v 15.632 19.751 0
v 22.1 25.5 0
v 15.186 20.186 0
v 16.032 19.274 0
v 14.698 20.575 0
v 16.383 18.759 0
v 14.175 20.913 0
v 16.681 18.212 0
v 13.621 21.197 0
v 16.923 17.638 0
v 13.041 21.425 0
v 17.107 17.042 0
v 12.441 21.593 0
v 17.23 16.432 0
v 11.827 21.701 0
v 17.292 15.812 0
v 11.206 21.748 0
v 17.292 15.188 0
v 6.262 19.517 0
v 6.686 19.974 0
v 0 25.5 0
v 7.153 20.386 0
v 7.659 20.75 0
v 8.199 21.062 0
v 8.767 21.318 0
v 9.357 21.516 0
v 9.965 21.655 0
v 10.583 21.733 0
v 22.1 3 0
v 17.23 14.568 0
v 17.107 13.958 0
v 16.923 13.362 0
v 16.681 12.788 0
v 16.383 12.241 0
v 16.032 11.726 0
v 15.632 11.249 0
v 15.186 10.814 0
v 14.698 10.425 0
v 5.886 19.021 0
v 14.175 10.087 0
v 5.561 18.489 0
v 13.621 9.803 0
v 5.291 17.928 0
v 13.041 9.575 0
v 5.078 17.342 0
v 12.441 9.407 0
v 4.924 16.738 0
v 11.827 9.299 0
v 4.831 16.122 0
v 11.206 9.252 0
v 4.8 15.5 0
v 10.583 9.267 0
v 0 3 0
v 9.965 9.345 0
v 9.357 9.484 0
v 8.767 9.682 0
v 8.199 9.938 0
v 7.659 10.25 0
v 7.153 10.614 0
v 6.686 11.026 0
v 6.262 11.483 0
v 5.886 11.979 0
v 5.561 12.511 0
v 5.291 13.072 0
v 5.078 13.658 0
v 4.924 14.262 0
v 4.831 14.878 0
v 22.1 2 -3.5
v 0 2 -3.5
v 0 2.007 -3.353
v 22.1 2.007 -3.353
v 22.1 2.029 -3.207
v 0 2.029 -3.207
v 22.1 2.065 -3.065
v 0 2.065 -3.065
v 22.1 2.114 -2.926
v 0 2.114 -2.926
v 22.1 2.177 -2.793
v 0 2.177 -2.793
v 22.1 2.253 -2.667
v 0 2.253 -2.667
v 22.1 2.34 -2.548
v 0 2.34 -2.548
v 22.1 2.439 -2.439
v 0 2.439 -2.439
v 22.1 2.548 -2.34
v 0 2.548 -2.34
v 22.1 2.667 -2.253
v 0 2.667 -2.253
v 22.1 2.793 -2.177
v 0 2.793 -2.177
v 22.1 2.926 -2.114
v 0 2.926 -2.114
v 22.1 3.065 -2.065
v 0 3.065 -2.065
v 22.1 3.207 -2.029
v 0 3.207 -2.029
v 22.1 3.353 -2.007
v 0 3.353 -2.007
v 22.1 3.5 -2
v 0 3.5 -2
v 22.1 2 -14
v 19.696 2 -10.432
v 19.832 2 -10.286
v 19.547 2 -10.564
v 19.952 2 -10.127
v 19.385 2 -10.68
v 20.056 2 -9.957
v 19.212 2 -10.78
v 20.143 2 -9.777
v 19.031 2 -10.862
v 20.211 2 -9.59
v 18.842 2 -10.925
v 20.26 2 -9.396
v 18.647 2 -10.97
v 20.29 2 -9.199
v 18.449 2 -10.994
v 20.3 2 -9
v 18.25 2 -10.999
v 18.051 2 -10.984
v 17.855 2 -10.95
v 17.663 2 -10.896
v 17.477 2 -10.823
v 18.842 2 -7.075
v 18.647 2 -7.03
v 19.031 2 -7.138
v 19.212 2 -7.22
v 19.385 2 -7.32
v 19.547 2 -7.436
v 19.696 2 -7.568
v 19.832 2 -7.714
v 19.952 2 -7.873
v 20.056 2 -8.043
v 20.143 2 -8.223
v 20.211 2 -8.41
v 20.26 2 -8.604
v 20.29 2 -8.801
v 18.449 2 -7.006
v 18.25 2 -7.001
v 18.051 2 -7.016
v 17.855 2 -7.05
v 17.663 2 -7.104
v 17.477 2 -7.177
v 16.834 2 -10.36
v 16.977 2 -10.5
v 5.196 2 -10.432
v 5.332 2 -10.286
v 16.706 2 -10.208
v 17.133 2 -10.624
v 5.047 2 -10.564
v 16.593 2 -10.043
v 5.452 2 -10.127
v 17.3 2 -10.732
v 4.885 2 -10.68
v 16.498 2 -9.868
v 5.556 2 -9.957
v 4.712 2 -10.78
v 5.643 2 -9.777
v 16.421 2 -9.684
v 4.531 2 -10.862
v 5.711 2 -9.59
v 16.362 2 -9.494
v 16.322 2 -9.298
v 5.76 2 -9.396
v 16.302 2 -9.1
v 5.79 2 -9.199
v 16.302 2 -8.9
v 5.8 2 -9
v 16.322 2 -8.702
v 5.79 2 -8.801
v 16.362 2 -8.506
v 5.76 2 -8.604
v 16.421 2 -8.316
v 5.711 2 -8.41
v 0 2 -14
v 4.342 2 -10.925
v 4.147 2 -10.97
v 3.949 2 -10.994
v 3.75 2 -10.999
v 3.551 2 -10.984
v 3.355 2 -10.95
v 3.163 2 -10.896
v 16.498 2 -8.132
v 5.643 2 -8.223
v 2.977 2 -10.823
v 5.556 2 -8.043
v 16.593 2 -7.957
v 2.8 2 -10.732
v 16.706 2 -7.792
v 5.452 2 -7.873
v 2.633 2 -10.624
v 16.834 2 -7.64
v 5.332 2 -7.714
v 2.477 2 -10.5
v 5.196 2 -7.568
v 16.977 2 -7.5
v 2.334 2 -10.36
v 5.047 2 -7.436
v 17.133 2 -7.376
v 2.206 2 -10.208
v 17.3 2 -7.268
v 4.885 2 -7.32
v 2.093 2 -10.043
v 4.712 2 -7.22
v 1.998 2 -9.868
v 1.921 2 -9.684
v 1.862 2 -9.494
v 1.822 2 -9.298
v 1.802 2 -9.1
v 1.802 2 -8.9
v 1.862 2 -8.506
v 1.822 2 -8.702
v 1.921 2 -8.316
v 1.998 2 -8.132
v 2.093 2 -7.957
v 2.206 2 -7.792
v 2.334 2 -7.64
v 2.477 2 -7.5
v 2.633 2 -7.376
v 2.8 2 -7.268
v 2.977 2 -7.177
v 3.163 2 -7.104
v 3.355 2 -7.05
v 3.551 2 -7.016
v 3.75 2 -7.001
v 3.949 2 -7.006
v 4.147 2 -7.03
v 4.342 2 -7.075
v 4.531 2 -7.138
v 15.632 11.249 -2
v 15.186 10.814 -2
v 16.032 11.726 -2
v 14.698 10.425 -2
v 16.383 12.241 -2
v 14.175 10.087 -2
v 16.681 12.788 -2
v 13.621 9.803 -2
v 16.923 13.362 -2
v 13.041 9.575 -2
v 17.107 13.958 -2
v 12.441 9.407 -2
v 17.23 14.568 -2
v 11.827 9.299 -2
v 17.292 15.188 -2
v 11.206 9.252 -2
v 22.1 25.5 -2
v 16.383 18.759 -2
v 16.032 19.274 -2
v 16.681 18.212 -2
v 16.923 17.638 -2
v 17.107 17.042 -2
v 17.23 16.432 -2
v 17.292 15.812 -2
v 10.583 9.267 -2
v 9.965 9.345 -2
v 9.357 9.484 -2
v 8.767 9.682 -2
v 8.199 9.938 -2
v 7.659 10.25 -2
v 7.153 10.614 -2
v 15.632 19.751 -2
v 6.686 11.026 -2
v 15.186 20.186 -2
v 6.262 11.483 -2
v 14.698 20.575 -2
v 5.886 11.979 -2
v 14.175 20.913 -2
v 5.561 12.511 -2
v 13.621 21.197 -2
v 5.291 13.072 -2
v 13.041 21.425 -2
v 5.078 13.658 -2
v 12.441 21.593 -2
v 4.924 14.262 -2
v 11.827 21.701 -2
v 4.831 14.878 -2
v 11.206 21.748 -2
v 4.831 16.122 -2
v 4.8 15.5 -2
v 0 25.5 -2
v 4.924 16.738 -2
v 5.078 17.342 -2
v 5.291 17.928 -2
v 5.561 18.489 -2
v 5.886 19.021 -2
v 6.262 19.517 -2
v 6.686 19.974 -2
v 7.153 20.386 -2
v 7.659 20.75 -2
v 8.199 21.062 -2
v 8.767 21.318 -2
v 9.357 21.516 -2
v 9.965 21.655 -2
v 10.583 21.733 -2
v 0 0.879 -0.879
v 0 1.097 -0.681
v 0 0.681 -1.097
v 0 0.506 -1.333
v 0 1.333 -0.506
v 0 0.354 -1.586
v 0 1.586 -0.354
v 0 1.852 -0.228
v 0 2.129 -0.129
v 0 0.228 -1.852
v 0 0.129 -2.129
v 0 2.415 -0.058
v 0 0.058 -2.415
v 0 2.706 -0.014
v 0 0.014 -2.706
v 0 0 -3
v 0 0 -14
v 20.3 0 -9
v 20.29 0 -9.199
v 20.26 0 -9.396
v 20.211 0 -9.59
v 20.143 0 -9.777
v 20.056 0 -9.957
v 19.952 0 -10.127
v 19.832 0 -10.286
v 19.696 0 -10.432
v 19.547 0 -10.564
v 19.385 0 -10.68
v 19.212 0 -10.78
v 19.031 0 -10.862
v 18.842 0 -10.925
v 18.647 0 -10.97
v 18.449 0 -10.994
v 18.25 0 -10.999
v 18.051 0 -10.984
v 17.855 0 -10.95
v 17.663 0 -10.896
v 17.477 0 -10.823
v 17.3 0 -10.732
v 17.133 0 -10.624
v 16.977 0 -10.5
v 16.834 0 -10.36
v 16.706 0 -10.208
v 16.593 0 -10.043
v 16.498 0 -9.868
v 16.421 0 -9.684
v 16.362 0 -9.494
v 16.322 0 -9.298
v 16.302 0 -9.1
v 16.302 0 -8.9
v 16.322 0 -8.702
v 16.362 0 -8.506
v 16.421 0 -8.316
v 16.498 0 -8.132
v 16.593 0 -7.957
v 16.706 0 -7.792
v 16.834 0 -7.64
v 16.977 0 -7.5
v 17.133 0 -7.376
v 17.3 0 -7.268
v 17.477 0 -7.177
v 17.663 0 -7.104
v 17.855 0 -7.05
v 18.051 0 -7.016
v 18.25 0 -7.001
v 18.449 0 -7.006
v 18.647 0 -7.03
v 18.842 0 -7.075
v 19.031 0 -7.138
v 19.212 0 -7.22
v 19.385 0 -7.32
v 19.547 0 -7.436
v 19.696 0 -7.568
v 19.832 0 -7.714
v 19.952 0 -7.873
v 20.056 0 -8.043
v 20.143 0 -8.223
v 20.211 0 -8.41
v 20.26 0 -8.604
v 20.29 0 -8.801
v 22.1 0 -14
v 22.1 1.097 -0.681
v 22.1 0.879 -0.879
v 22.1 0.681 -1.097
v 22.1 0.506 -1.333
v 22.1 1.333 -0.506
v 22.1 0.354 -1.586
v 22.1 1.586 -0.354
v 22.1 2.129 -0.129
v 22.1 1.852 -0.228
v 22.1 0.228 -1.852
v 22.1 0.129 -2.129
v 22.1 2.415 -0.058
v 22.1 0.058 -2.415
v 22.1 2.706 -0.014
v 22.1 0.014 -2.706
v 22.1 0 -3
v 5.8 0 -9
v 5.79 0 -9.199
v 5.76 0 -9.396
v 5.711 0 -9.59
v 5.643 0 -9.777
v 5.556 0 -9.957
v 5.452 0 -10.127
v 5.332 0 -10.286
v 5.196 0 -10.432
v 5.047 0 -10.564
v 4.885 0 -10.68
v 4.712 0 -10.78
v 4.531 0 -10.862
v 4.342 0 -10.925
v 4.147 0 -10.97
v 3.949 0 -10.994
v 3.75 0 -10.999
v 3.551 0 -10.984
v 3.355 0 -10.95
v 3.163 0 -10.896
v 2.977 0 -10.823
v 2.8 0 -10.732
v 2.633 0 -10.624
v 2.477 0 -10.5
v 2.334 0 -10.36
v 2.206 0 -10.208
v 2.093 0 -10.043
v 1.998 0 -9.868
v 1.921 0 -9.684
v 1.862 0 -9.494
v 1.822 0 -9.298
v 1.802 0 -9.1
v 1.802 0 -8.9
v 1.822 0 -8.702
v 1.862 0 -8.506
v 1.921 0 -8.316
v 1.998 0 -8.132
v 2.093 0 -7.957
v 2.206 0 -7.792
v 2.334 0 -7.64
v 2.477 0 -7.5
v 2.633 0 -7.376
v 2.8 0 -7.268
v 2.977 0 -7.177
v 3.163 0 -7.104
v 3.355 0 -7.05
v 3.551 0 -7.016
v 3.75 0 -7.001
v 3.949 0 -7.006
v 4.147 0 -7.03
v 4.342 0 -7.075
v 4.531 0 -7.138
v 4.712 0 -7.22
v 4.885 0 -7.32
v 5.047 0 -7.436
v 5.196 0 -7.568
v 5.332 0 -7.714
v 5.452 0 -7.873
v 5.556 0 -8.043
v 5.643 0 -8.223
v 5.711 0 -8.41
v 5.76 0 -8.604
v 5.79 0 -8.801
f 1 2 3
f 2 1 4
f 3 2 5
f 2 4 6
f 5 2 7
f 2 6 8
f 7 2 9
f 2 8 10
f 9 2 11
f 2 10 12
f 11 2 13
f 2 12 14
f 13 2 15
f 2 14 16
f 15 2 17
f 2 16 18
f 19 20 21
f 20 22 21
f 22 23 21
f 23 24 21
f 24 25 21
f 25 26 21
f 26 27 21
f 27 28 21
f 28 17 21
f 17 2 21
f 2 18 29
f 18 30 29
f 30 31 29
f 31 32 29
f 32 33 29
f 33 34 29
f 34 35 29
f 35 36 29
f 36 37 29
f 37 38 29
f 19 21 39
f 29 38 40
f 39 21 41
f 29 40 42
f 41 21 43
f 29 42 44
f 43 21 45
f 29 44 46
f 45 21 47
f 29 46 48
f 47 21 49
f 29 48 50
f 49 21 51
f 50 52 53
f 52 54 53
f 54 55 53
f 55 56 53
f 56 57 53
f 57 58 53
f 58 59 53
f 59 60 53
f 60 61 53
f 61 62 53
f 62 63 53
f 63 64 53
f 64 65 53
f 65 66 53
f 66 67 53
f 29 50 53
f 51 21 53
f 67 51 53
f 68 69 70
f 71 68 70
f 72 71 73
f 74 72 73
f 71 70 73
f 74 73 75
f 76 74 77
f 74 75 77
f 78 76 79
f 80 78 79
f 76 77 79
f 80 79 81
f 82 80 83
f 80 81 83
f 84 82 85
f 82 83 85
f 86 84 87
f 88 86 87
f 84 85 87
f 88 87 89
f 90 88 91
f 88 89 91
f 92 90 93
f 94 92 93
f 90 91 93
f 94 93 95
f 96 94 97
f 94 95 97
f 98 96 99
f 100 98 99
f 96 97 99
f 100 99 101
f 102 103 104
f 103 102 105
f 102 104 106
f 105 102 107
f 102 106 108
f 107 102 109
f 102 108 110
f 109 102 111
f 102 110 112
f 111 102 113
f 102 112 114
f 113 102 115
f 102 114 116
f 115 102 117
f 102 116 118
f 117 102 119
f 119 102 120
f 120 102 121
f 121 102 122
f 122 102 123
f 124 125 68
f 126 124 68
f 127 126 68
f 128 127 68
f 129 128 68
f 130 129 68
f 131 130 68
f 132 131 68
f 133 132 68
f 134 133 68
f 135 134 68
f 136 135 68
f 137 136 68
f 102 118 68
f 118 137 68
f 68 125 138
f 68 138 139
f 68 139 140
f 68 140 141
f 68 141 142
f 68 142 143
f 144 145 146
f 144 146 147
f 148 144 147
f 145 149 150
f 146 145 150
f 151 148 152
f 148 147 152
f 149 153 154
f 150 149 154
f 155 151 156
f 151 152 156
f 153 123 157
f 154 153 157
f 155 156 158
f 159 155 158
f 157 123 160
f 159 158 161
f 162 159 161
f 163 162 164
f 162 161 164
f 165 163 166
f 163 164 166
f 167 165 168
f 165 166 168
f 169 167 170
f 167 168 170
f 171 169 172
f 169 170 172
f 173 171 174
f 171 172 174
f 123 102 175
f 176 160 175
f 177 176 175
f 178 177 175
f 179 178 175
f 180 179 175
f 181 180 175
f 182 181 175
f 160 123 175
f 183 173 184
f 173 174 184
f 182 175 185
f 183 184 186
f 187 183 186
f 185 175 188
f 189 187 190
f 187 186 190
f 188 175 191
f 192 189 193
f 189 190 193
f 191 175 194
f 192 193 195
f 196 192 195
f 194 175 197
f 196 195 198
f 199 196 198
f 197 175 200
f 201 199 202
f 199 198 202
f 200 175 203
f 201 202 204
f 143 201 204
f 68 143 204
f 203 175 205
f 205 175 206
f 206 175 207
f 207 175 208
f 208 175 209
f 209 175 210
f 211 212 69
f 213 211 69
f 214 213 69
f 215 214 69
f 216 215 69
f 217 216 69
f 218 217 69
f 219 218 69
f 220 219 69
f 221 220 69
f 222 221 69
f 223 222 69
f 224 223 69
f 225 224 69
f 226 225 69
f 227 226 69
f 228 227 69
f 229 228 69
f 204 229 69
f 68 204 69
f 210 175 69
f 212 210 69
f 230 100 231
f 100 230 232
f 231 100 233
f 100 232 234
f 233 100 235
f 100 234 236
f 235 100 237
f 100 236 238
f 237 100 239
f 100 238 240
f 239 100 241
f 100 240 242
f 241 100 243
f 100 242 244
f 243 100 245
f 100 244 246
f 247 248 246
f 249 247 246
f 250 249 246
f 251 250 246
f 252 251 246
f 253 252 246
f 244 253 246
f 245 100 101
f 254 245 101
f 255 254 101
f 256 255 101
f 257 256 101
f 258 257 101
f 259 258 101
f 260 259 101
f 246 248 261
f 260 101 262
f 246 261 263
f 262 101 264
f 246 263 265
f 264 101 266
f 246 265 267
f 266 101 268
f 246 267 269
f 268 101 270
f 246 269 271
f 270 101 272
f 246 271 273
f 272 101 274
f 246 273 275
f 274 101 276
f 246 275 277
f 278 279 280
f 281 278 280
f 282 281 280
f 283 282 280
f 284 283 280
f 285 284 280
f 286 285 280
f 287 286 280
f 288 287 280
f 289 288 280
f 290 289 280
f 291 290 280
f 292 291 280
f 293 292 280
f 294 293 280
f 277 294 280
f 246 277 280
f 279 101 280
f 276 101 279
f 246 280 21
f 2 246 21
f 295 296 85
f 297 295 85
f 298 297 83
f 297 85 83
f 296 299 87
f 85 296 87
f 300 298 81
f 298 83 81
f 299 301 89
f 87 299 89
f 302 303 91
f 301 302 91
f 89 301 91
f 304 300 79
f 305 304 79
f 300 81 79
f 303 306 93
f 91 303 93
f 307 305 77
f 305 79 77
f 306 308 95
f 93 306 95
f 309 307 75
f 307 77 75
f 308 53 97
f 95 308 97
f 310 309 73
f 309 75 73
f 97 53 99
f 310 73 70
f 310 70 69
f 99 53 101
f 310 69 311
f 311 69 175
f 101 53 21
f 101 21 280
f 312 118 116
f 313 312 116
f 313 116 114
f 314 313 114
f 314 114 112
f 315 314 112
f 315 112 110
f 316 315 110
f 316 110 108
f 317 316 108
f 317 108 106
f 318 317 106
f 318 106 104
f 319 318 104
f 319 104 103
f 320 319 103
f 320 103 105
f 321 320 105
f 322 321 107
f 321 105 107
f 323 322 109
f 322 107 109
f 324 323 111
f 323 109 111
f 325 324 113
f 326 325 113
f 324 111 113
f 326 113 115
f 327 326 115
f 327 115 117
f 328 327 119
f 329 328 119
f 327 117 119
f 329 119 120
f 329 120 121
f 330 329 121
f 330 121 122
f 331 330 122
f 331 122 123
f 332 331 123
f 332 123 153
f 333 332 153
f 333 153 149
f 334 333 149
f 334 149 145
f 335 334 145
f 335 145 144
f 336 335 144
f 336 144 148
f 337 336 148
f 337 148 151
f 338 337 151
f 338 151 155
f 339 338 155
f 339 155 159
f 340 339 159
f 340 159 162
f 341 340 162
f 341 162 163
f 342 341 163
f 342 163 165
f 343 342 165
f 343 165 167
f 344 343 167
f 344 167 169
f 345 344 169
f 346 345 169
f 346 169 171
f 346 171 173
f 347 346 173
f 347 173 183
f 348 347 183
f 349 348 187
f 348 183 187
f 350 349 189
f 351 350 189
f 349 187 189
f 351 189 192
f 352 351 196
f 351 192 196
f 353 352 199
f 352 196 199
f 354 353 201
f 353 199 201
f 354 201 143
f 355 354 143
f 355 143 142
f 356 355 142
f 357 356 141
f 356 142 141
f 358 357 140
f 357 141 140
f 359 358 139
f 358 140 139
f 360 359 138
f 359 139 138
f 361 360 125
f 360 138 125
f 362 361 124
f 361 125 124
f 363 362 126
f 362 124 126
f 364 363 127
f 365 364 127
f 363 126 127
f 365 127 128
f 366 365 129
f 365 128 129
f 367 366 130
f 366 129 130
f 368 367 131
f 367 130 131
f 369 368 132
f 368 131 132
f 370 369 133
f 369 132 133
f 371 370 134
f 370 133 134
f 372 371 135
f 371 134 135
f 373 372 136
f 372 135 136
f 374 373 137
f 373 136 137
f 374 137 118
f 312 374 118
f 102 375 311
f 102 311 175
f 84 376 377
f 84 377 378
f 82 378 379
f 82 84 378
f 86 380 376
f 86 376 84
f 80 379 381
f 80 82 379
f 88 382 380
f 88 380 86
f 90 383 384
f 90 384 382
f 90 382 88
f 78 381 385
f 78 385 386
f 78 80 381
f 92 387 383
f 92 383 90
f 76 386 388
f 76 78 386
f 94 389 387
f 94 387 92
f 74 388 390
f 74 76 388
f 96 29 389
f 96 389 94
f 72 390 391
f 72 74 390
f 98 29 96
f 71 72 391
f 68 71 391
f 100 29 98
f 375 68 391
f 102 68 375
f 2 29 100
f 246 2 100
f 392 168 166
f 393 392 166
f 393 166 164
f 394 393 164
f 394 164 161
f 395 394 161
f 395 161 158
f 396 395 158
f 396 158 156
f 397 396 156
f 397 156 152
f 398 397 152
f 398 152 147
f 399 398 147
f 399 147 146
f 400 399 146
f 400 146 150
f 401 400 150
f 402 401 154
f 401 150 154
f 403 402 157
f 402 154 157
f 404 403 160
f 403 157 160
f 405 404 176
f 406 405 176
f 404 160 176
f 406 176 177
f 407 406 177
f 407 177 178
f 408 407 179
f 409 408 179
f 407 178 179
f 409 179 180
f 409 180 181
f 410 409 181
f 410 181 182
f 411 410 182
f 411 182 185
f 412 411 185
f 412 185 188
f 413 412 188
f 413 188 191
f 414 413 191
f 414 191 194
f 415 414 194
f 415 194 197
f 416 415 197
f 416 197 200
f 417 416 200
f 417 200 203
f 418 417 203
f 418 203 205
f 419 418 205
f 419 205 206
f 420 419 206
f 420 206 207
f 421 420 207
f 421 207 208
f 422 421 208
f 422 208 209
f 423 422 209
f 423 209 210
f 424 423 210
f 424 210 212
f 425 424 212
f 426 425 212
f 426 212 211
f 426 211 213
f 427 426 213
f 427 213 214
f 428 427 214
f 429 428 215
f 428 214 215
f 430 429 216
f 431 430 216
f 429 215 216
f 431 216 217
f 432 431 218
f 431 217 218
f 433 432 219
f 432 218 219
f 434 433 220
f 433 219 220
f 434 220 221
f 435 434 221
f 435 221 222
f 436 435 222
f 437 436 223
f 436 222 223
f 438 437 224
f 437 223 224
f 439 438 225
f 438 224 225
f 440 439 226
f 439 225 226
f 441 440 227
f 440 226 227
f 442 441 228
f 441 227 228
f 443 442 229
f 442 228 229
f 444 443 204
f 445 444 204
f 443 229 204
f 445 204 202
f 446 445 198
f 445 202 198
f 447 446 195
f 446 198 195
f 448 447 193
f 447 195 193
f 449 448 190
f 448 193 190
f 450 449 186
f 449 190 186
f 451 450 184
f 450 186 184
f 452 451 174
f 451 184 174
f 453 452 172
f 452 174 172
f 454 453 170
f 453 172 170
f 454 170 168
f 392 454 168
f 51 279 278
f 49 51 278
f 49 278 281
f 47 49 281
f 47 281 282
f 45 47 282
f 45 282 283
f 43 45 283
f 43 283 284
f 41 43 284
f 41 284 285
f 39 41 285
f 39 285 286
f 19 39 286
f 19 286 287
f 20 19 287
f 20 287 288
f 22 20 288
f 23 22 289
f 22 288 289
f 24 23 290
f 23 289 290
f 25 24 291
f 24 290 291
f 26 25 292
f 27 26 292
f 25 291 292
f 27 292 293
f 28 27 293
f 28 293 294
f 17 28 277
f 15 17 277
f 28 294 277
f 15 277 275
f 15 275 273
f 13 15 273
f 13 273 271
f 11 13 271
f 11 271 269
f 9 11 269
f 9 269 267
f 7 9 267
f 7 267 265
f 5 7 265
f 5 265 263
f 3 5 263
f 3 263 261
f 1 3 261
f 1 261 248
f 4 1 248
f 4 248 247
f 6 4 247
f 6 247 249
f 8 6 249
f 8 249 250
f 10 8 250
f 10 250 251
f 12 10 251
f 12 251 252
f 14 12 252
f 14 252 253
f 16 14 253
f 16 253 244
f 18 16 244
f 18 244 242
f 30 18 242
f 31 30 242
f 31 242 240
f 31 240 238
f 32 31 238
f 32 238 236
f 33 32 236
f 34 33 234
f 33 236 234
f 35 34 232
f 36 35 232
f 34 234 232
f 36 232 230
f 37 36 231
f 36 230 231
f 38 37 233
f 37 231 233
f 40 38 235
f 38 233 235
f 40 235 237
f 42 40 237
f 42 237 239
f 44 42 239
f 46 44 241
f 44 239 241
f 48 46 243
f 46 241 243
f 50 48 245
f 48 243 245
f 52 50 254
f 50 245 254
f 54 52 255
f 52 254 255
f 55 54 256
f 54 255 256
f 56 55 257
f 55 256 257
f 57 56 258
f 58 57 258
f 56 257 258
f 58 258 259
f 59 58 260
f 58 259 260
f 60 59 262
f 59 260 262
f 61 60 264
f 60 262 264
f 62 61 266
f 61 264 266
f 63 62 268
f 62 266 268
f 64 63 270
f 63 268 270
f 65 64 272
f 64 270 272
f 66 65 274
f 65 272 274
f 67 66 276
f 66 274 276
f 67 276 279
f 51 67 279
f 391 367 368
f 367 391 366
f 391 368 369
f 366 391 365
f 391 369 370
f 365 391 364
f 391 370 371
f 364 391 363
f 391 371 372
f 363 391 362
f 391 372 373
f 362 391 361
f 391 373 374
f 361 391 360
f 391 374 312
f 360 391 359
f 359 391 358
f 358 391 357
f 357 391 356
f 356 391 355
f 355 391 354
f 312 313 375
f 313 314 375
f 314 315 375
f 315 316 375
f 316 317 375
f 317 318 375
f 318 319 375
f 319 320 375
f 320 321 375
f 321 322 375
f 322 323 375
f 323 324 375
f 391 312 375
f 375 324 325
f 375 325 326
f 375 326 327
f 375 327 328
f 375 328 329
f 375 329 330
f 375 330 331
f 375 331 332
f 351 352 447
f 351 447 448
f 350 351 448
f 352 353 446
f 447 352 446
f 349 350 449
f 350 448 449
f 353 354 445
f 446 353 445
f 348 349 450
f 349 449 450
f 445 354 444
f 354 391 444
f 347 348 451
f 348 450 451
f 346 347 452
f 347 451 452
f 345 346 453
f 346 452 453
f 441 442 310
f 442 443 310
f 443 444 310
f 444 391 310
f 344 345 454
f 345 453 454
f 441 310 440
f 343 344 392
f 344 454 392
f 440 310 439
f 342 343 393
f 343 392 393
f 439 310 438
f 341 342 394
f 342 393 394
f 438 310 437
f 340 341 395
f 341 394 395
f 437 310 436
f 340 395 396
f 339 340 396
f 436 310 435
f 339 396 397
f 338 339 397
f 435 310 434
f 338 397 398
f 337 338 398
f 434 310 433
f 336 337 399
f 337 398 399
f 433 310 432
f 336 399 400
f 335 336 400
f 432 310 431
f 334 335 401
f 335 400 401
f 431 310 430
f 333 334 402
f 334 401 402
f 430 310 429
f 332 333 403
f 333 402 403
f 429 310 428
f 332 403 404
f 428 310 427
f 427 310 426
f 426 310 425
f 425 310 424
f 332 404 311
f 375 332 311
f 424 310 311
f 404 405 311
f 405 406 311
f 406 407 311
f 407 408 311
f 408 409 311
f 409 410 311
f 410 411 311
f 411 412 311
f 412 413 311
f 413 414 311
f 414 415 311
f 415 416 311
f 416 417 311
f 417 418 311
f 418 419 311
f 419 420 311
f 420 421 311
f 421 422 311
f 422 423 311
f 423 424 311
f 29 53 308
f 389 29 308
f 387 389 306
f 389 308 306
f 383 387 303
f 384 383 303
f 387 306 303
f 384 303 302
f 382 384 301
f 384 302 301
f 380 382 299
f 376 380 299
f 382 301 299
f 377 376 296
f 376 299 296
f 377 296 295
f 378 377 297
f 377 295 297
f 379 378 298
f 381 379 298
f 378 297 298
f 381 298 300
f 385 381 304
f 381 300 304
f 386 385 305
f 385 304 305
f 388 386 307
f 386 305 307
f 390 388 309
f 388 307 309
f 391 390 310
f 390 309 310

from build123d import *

# Parameters (mm, degrees)
BOSS_EXTRU_1_DEPTH      = 22.1
ESQUISSE2_R             = 2
ENL_V_MAT_EXTRU_1_DEPTH = 3
ESQUISSE3_R             = 6.25
ENL_V_MAT_EXTRU_2_DEPTH = 3


with BuildPart() as part:
    # Esquisse1 → Boss.-Extru.1 (new body)
    with BuildSketch(Plane(origin=(0, 0, 0), x_dir=(0, 0, -1), z_dir=(1, 0, 0))):
        with BuildLine():
            Line((0, 25.5), (0, 3))
            ThreePointArc((0, 3), (0.878679656, 0.878679656), (3, 0))
            Line((3, 0), (14, 0))
            Line((14, 0), (14, 2))
            Line((14, 2), (3.5, 2))
            ThreePointArc((3.5, 2), (2.439339828, 2.439339828), (2, 3.5))
            Line((2, 3.5), (2, 25.5))
            Line((2, 25.5), (0, 25.5))
        make_face()
    extrude(amount=BOSS_EXTRU_1_DEPTH)

    # Esquisse2 → Enlèv. mat.-Extru.1 (cut, through all)
    with BuildSketch(Plane(origin=(0, 2, 0), x_dir=(1, 0, 0), z_dir=(0, 1, 0))):
        with Locations((3.8, 9)):
            Circle(ESQUISSE2_R)
        with Locations((18.3, 9)):
            Circle(ESQUISSE2_R)
    extrude(amount=-ENL_V_MAT_EXTRU_1_DEPTH, mode=Mode.SUBTRACT)

    # Esquisse3 → Enlèv. mat.-Extru.2 (cut, through all)
    with BuildSketch(Plane(origin=(0, 0, -2), x_dir=(-1, 0, 0), z_dir=(0, 0, -1))):
        with Locations((-11.05, 15.5)):
            Circle(ESQUISSE3_R)
    extrude(amount=-ENL_V_MAT_EXTRU_2_DEPTH, mode=Mode.SUBTRACT)


solid = part.part
